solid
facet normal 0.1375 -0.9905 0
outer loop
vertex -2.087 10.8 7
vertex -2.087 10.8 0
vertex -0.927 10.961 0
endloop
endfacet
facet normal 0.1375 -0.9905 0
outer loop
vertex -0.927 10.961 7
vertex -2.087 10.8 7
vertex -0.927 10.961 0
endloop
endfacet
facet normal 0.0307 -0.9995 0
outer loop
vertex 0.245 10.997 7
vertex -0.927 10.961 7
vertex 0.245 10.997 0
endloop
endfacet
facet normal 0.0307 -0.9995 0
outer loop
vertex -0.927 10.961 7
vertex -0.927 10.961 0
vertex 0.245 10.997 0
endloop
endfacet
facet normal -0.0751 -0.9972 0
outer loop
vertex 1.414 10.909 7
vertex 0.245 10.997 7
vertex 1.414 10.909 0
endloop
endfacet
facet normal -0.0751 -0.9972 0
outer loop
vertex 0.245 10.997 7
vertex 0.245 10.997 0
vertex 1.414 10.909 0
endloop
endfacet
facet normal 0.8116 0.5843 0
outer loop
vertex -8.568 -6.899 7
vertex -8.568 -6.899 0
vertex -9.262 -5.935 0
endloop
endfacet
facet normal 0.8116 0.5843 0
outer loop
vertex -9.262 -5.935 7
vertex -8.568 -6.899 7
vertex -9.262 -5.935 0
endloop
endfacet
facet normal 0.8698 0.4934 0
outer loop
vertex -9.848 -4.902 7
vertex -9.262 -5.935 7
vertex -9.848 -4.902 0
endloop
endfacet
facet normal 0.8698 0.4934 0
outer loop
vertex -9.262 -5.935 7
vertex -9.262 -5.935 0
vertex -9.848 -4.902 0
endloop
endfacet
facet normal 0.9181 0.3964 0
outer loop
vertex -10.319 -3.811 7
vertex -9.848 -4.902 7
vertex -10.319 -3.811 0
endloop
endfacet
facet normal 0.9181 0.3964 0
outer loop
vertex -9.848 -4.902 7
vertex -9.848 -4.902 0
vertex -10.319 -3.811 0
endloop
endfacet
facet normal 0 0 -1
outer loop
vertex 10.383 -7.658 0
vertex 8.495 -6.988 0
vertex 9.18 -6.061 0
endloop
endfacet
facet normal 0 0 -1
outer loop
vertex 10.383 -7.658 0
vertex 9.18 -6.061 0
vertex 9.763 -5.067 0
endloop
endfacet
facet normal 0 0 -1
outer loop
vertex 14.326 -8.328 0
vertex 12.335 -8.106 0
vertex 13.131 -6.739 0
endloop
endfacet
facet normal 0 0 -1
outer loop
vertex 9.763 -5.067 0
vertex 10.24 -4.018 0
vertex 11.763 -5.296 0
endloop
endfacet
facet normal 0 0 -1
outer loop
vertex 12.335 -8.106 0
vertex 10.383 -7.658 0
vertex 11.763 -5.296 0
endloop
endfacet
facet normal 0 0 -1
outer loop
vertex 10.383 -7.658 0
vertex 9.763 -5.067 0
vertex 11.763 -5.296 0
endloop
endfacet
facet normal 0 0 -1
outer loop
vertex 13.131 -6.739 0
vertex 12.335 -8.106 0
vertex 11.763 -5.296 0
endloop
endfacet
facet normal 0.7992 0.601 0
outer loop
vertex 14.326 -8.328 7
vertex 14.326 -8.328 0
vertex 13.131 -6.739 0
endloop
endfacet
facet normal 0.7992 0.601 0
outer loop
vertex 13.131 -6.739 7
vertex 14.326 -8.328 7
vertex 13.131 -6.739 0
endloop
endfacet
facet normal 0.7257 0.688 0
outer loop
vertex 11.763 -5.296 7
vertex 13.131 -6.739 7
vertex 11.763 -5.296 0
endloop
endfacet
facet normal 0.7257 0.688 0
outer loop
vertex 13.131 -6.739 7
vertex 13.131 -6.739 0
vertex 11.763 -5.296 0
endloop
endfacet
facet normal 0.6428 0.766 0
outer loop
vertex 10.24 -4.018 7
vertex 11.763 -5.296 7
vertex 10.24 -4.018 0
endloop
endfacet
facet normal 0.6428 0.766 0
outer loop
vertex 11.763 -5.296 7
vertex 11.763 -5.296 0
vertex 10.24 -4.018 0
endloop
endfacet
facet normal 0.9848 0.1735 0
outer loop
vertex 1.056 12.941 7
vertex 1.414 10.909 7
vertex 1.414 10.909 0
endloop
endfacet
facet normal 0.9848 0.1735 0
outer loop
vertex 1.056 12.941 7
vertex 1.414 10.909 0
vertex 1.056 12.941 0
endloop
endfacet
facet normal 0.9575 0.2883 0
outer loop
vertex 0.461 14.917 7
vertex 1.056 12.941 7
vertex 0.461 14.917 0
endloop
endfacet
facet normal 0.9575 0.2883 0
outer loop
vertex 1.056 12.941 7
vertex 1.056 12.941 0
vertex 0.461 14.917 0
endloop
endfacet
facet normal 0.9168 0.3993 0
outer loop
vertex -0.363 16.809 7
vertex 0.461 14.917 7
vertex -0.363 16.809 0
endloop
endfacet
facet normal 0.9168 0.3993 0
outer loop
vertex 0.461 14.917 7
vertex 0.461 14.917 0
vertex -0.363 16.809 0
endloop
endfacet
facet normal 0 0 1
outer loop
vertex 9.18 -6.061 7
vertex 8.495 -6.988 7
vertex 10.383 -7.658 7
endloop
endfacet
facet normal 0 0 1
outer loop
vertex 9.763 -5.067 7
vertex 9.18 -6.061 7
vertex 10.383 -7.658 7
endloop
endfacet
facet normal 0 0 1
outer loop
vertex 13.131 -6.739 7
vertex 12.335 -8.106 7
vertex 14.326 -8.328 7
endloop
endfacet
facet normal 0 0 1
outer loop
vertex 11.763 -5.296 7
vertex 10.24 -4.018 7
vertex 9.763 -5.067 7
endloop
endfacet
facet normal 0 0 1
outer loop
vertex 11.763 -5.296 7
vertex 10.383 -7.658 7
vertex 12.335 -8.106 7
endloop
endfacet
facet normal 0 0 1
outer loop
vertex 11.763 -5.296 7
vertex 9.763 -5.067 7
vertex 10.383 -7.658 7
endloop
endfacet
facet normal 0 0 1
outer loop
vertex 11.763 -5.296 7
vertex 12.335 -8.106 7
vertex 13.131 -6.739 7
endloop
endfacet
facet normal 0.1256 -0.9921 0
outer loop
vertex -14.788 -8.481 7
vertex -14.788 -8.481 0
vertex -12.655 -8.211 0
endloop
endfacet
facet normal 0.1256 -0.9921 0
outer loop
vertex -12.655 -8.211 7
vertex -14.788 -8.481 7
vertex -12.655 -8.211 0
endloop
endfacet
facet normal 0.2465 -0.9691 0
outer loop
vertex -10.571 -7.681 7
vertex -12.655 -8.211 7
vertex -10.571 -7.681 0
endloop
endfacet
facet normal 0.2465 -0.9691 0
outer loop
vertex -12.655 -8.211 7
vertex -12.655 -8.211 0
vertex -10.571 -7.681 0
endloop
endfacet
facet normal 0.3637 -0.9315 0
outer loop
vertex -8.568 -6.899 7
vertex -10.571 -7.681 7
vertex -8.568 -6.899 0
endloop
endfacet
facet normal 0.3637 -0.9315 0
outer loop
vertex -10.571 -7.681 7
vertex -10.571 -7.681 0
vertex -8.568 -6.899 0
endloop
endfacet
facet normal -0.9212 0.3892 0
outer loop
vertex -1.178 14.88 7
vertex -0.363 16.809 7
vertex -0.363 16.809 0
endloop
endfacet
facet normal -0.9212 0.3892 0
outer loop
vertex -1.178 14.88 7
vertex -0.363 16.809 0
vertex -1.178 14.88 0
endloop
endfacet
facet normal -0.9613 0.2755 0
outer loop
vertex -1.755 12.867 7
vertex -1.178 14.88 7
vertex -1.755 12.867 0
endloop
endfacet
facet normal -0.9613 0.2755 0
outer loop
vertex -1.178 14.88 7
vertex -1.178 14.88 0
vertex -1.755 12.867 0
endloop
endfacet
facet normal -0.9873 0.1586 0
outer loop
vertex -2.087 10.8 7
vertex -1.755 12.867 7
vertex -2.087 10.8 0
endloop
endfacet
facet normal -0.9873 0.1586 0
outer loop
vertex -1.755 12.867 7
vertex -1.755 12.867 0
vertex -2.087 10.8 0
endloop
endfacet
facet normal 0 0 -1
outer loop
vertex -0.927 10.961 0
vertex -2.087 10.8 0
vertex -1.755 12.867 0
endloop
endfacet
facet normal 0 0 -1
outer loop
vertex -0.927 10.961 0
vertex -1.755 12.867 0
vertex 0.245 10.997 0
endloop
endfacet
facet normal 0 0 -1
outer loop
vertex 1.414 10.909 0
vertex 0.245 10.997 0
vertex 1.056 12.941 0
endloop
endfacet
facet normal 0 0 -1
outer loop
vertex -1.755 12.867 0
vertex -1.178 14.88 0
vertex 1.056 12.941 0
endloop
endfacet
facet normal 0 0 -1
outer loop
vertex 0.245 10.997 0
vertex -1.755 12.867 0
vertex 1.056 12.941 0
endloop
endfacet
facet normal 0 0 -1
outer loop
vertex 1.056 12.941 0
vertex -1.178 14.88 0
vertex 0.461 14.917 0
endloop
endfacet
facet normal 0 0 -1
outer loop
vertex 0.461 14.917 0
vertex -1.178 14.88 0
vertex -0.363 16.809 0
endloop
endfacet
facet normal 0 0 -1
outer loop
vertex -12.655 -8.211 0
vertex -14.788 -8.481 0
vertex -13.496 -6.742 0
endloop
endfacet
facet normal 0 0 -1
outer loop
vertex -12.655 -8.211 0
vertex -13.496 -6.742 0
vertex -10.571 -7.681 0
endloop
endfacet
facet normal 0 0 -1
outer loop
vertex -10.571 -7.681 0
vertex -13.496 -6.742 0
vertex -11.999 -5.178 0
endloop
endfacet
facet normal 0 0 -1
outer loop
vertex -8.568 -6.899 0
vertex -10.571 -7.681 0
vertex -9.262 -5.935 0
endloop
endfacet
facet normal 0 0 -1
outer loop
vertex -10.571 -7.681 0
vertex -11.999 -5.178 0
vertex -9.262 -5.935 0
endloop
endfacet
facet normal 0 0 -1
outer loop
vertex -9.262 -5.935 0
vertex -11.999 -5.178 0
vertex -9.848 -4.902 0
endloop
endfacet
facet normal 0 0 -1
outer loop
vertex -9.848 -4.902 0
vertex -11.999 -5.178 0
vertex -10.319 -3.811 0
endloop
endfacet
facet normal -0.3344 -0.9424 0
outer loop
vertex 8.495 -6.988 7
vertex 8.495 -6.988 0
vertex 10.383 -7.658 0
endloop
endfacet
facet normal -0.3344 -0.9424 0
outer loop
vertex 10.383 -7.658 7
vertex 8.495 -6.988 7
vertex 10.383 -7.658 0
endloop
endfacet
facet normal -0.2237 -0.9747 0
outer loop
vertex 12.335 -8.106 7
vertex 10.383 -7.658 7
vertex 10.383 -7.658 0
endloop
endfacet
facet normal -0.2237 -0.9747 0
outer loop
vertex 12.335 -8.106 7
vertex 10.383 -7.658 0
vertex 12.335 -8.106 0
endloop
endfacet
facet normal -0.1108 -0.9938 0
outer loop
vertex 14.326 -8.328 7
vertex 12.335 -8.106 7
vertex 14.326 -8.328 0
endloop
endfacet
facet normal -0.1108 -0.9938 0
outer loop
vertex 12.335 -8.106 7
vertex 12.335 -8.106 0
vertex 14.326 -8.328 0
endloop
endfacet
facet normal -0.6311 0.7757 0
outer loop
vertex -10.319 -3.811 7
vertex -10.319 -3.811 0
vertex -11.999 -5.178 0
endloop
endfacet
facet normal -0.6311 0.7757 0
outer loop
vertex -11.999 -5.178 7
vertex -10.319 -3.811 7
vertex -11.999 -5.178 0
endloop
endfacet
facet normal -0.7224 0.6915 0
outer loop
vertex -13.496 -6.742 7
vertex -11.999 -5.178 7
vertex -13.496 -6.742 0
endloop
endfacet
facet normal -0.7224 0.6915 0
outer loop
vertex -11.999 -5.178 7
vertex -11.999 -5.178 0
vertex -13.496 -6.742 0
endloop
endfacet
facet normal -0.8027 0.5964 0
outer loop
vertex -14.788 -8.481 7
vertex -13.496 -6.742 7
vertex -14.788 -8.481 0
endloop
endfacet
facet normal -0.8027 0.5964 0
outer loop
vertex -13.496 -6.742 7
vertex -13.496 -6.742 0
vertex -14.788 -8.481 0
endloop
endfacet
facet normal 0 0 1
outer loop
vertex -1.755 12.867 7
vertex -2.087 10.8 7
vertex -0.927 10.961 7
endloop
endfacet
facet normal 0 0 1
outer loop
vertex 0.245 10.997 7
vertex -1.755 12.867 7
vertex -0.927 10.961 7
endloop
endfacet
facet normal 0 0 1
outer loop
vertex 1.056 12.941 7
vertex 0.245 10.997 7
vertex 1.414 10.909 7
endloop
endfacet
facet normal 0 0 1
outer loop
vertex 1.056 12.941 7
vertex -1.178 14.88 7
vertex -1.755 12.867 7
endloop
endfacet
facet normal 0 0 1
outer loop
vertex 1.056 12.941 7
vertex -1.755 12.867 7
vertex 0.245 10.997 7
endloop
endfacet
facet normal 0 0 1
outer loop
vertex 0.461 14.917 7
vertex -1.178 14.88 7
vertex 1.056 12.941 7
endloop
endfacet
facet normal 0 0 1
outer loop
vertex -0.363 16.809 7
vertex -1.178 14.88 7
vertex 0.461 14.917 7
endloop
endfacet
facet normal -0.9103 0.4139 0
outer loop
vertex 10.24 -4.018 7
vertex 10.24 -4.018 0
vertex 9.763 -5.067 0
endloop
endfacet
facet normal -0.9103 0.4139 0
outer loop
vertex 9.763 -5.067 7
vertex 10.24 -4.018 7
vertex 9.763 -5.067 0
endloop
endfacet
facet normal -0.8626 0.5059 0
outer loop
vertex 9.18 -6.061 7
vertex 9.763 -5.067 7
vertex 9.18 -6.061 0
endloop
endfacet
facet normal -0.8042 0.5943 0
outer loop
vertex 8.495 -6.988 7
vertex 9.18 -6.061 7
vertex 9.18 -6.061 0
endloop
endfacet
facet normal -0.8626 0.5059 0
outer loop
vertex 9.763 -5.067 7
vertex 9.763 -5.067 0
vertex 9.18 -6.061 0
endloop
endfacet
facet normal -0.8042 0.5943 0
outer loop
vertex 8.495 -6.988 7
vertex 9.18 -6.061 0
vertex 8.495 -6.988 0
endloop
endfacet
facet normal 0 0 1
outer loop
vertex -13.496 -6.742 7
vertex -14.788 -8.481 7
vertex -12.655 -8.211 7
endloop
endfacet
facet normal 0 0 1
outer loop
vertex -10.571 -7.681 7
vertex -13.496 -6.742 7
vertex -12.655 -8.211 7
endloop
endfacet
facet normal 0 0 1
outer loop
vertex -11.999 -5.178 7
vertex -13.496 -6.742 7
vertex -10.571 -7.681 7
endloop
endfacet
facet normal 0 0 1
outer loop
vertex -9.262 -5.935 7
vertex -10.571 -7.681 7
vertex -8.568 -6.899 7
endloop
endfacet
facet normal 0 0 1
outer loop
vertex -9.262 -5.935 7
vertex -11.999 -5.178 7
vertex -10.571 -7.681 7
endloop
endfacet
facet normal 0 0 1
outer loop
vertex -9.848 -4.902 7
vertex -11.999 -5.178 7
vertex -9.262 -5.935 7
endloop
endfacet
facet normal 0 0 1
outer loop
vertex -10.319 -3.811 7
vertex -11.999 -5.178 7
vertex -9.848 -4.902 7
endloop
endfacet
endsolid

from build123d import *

# Parameters (mm, degrees)
F1_DEPTH = 7


with BuildPart() as f1:
    # F0 (on Top) → F1 (new body)
    with BuildSketch(Plane.XY):
        with BuildLine():
            ThreePointArc((-2.0874247971, 10.8001230417), (-0.3412729495, 10.9947047607), (1.4135853304, 10.9087935407))
            ThreePointArc((1.4135853304, 10.9087935407), (0.7879532463, 13.9378746158), (-0.3632838289, 16.8086586307))
            ThreePointArc((-0.3632838289, 16.8086586307), (-1.4969434902, 13.8823229746), (-2.0874247971, 10.8001230417))
        make_face()
    extrude(amount=F1_DEPTH)


with BuildPart() as f1b:
    # F0 (on Top) → F1, piece 2 (new body)
    with BuildSketch(Plane.XY):
        with BuildLine():
            ThreePointArc((-8.5677589565, -6.8988047126), (-9.5685930185, -5.4260508333), (-10.3186925541, -3.8111132198))
            ThreePointArc((-10.3186925541, -3.8111132198), (-12.7716309008, -5.936880497), (-14.787835926, -8.4806395945))
            ThreePointArc((-14.787835926, -8.4806395945), (-11.6043540641, -7.9785155441), (-8.5677589565, -6.8988047126))
        make_face()
    extrude(amount=F1_DEPTH)


with BuildPart() as f1c:
    # F0 (on Top) → F1, piece 3 (new body)
    with BuildSketch(Plane.XY):
        with BuildLine():
            ThreePointArc((14.3256148295, -8.3280190362), (12.4677367088, -5.9976199722), (10.2399674985, -4.0178434052))
            ThreePointArc((10.2399674985, -4.0178434052), (9.484460261, -5.5718052333), (8.4949307428, -6.9882867482))
            ThreePointArc((8.4949307428, -6.9882867482), (11.3523562473, -7.9102129823), (14.3256148295, -8.3280190362))
        make_face()
    extrude(amount=F1_DEPTH)


solid = Compound([f1.part, f1b.part, f1c.part])
